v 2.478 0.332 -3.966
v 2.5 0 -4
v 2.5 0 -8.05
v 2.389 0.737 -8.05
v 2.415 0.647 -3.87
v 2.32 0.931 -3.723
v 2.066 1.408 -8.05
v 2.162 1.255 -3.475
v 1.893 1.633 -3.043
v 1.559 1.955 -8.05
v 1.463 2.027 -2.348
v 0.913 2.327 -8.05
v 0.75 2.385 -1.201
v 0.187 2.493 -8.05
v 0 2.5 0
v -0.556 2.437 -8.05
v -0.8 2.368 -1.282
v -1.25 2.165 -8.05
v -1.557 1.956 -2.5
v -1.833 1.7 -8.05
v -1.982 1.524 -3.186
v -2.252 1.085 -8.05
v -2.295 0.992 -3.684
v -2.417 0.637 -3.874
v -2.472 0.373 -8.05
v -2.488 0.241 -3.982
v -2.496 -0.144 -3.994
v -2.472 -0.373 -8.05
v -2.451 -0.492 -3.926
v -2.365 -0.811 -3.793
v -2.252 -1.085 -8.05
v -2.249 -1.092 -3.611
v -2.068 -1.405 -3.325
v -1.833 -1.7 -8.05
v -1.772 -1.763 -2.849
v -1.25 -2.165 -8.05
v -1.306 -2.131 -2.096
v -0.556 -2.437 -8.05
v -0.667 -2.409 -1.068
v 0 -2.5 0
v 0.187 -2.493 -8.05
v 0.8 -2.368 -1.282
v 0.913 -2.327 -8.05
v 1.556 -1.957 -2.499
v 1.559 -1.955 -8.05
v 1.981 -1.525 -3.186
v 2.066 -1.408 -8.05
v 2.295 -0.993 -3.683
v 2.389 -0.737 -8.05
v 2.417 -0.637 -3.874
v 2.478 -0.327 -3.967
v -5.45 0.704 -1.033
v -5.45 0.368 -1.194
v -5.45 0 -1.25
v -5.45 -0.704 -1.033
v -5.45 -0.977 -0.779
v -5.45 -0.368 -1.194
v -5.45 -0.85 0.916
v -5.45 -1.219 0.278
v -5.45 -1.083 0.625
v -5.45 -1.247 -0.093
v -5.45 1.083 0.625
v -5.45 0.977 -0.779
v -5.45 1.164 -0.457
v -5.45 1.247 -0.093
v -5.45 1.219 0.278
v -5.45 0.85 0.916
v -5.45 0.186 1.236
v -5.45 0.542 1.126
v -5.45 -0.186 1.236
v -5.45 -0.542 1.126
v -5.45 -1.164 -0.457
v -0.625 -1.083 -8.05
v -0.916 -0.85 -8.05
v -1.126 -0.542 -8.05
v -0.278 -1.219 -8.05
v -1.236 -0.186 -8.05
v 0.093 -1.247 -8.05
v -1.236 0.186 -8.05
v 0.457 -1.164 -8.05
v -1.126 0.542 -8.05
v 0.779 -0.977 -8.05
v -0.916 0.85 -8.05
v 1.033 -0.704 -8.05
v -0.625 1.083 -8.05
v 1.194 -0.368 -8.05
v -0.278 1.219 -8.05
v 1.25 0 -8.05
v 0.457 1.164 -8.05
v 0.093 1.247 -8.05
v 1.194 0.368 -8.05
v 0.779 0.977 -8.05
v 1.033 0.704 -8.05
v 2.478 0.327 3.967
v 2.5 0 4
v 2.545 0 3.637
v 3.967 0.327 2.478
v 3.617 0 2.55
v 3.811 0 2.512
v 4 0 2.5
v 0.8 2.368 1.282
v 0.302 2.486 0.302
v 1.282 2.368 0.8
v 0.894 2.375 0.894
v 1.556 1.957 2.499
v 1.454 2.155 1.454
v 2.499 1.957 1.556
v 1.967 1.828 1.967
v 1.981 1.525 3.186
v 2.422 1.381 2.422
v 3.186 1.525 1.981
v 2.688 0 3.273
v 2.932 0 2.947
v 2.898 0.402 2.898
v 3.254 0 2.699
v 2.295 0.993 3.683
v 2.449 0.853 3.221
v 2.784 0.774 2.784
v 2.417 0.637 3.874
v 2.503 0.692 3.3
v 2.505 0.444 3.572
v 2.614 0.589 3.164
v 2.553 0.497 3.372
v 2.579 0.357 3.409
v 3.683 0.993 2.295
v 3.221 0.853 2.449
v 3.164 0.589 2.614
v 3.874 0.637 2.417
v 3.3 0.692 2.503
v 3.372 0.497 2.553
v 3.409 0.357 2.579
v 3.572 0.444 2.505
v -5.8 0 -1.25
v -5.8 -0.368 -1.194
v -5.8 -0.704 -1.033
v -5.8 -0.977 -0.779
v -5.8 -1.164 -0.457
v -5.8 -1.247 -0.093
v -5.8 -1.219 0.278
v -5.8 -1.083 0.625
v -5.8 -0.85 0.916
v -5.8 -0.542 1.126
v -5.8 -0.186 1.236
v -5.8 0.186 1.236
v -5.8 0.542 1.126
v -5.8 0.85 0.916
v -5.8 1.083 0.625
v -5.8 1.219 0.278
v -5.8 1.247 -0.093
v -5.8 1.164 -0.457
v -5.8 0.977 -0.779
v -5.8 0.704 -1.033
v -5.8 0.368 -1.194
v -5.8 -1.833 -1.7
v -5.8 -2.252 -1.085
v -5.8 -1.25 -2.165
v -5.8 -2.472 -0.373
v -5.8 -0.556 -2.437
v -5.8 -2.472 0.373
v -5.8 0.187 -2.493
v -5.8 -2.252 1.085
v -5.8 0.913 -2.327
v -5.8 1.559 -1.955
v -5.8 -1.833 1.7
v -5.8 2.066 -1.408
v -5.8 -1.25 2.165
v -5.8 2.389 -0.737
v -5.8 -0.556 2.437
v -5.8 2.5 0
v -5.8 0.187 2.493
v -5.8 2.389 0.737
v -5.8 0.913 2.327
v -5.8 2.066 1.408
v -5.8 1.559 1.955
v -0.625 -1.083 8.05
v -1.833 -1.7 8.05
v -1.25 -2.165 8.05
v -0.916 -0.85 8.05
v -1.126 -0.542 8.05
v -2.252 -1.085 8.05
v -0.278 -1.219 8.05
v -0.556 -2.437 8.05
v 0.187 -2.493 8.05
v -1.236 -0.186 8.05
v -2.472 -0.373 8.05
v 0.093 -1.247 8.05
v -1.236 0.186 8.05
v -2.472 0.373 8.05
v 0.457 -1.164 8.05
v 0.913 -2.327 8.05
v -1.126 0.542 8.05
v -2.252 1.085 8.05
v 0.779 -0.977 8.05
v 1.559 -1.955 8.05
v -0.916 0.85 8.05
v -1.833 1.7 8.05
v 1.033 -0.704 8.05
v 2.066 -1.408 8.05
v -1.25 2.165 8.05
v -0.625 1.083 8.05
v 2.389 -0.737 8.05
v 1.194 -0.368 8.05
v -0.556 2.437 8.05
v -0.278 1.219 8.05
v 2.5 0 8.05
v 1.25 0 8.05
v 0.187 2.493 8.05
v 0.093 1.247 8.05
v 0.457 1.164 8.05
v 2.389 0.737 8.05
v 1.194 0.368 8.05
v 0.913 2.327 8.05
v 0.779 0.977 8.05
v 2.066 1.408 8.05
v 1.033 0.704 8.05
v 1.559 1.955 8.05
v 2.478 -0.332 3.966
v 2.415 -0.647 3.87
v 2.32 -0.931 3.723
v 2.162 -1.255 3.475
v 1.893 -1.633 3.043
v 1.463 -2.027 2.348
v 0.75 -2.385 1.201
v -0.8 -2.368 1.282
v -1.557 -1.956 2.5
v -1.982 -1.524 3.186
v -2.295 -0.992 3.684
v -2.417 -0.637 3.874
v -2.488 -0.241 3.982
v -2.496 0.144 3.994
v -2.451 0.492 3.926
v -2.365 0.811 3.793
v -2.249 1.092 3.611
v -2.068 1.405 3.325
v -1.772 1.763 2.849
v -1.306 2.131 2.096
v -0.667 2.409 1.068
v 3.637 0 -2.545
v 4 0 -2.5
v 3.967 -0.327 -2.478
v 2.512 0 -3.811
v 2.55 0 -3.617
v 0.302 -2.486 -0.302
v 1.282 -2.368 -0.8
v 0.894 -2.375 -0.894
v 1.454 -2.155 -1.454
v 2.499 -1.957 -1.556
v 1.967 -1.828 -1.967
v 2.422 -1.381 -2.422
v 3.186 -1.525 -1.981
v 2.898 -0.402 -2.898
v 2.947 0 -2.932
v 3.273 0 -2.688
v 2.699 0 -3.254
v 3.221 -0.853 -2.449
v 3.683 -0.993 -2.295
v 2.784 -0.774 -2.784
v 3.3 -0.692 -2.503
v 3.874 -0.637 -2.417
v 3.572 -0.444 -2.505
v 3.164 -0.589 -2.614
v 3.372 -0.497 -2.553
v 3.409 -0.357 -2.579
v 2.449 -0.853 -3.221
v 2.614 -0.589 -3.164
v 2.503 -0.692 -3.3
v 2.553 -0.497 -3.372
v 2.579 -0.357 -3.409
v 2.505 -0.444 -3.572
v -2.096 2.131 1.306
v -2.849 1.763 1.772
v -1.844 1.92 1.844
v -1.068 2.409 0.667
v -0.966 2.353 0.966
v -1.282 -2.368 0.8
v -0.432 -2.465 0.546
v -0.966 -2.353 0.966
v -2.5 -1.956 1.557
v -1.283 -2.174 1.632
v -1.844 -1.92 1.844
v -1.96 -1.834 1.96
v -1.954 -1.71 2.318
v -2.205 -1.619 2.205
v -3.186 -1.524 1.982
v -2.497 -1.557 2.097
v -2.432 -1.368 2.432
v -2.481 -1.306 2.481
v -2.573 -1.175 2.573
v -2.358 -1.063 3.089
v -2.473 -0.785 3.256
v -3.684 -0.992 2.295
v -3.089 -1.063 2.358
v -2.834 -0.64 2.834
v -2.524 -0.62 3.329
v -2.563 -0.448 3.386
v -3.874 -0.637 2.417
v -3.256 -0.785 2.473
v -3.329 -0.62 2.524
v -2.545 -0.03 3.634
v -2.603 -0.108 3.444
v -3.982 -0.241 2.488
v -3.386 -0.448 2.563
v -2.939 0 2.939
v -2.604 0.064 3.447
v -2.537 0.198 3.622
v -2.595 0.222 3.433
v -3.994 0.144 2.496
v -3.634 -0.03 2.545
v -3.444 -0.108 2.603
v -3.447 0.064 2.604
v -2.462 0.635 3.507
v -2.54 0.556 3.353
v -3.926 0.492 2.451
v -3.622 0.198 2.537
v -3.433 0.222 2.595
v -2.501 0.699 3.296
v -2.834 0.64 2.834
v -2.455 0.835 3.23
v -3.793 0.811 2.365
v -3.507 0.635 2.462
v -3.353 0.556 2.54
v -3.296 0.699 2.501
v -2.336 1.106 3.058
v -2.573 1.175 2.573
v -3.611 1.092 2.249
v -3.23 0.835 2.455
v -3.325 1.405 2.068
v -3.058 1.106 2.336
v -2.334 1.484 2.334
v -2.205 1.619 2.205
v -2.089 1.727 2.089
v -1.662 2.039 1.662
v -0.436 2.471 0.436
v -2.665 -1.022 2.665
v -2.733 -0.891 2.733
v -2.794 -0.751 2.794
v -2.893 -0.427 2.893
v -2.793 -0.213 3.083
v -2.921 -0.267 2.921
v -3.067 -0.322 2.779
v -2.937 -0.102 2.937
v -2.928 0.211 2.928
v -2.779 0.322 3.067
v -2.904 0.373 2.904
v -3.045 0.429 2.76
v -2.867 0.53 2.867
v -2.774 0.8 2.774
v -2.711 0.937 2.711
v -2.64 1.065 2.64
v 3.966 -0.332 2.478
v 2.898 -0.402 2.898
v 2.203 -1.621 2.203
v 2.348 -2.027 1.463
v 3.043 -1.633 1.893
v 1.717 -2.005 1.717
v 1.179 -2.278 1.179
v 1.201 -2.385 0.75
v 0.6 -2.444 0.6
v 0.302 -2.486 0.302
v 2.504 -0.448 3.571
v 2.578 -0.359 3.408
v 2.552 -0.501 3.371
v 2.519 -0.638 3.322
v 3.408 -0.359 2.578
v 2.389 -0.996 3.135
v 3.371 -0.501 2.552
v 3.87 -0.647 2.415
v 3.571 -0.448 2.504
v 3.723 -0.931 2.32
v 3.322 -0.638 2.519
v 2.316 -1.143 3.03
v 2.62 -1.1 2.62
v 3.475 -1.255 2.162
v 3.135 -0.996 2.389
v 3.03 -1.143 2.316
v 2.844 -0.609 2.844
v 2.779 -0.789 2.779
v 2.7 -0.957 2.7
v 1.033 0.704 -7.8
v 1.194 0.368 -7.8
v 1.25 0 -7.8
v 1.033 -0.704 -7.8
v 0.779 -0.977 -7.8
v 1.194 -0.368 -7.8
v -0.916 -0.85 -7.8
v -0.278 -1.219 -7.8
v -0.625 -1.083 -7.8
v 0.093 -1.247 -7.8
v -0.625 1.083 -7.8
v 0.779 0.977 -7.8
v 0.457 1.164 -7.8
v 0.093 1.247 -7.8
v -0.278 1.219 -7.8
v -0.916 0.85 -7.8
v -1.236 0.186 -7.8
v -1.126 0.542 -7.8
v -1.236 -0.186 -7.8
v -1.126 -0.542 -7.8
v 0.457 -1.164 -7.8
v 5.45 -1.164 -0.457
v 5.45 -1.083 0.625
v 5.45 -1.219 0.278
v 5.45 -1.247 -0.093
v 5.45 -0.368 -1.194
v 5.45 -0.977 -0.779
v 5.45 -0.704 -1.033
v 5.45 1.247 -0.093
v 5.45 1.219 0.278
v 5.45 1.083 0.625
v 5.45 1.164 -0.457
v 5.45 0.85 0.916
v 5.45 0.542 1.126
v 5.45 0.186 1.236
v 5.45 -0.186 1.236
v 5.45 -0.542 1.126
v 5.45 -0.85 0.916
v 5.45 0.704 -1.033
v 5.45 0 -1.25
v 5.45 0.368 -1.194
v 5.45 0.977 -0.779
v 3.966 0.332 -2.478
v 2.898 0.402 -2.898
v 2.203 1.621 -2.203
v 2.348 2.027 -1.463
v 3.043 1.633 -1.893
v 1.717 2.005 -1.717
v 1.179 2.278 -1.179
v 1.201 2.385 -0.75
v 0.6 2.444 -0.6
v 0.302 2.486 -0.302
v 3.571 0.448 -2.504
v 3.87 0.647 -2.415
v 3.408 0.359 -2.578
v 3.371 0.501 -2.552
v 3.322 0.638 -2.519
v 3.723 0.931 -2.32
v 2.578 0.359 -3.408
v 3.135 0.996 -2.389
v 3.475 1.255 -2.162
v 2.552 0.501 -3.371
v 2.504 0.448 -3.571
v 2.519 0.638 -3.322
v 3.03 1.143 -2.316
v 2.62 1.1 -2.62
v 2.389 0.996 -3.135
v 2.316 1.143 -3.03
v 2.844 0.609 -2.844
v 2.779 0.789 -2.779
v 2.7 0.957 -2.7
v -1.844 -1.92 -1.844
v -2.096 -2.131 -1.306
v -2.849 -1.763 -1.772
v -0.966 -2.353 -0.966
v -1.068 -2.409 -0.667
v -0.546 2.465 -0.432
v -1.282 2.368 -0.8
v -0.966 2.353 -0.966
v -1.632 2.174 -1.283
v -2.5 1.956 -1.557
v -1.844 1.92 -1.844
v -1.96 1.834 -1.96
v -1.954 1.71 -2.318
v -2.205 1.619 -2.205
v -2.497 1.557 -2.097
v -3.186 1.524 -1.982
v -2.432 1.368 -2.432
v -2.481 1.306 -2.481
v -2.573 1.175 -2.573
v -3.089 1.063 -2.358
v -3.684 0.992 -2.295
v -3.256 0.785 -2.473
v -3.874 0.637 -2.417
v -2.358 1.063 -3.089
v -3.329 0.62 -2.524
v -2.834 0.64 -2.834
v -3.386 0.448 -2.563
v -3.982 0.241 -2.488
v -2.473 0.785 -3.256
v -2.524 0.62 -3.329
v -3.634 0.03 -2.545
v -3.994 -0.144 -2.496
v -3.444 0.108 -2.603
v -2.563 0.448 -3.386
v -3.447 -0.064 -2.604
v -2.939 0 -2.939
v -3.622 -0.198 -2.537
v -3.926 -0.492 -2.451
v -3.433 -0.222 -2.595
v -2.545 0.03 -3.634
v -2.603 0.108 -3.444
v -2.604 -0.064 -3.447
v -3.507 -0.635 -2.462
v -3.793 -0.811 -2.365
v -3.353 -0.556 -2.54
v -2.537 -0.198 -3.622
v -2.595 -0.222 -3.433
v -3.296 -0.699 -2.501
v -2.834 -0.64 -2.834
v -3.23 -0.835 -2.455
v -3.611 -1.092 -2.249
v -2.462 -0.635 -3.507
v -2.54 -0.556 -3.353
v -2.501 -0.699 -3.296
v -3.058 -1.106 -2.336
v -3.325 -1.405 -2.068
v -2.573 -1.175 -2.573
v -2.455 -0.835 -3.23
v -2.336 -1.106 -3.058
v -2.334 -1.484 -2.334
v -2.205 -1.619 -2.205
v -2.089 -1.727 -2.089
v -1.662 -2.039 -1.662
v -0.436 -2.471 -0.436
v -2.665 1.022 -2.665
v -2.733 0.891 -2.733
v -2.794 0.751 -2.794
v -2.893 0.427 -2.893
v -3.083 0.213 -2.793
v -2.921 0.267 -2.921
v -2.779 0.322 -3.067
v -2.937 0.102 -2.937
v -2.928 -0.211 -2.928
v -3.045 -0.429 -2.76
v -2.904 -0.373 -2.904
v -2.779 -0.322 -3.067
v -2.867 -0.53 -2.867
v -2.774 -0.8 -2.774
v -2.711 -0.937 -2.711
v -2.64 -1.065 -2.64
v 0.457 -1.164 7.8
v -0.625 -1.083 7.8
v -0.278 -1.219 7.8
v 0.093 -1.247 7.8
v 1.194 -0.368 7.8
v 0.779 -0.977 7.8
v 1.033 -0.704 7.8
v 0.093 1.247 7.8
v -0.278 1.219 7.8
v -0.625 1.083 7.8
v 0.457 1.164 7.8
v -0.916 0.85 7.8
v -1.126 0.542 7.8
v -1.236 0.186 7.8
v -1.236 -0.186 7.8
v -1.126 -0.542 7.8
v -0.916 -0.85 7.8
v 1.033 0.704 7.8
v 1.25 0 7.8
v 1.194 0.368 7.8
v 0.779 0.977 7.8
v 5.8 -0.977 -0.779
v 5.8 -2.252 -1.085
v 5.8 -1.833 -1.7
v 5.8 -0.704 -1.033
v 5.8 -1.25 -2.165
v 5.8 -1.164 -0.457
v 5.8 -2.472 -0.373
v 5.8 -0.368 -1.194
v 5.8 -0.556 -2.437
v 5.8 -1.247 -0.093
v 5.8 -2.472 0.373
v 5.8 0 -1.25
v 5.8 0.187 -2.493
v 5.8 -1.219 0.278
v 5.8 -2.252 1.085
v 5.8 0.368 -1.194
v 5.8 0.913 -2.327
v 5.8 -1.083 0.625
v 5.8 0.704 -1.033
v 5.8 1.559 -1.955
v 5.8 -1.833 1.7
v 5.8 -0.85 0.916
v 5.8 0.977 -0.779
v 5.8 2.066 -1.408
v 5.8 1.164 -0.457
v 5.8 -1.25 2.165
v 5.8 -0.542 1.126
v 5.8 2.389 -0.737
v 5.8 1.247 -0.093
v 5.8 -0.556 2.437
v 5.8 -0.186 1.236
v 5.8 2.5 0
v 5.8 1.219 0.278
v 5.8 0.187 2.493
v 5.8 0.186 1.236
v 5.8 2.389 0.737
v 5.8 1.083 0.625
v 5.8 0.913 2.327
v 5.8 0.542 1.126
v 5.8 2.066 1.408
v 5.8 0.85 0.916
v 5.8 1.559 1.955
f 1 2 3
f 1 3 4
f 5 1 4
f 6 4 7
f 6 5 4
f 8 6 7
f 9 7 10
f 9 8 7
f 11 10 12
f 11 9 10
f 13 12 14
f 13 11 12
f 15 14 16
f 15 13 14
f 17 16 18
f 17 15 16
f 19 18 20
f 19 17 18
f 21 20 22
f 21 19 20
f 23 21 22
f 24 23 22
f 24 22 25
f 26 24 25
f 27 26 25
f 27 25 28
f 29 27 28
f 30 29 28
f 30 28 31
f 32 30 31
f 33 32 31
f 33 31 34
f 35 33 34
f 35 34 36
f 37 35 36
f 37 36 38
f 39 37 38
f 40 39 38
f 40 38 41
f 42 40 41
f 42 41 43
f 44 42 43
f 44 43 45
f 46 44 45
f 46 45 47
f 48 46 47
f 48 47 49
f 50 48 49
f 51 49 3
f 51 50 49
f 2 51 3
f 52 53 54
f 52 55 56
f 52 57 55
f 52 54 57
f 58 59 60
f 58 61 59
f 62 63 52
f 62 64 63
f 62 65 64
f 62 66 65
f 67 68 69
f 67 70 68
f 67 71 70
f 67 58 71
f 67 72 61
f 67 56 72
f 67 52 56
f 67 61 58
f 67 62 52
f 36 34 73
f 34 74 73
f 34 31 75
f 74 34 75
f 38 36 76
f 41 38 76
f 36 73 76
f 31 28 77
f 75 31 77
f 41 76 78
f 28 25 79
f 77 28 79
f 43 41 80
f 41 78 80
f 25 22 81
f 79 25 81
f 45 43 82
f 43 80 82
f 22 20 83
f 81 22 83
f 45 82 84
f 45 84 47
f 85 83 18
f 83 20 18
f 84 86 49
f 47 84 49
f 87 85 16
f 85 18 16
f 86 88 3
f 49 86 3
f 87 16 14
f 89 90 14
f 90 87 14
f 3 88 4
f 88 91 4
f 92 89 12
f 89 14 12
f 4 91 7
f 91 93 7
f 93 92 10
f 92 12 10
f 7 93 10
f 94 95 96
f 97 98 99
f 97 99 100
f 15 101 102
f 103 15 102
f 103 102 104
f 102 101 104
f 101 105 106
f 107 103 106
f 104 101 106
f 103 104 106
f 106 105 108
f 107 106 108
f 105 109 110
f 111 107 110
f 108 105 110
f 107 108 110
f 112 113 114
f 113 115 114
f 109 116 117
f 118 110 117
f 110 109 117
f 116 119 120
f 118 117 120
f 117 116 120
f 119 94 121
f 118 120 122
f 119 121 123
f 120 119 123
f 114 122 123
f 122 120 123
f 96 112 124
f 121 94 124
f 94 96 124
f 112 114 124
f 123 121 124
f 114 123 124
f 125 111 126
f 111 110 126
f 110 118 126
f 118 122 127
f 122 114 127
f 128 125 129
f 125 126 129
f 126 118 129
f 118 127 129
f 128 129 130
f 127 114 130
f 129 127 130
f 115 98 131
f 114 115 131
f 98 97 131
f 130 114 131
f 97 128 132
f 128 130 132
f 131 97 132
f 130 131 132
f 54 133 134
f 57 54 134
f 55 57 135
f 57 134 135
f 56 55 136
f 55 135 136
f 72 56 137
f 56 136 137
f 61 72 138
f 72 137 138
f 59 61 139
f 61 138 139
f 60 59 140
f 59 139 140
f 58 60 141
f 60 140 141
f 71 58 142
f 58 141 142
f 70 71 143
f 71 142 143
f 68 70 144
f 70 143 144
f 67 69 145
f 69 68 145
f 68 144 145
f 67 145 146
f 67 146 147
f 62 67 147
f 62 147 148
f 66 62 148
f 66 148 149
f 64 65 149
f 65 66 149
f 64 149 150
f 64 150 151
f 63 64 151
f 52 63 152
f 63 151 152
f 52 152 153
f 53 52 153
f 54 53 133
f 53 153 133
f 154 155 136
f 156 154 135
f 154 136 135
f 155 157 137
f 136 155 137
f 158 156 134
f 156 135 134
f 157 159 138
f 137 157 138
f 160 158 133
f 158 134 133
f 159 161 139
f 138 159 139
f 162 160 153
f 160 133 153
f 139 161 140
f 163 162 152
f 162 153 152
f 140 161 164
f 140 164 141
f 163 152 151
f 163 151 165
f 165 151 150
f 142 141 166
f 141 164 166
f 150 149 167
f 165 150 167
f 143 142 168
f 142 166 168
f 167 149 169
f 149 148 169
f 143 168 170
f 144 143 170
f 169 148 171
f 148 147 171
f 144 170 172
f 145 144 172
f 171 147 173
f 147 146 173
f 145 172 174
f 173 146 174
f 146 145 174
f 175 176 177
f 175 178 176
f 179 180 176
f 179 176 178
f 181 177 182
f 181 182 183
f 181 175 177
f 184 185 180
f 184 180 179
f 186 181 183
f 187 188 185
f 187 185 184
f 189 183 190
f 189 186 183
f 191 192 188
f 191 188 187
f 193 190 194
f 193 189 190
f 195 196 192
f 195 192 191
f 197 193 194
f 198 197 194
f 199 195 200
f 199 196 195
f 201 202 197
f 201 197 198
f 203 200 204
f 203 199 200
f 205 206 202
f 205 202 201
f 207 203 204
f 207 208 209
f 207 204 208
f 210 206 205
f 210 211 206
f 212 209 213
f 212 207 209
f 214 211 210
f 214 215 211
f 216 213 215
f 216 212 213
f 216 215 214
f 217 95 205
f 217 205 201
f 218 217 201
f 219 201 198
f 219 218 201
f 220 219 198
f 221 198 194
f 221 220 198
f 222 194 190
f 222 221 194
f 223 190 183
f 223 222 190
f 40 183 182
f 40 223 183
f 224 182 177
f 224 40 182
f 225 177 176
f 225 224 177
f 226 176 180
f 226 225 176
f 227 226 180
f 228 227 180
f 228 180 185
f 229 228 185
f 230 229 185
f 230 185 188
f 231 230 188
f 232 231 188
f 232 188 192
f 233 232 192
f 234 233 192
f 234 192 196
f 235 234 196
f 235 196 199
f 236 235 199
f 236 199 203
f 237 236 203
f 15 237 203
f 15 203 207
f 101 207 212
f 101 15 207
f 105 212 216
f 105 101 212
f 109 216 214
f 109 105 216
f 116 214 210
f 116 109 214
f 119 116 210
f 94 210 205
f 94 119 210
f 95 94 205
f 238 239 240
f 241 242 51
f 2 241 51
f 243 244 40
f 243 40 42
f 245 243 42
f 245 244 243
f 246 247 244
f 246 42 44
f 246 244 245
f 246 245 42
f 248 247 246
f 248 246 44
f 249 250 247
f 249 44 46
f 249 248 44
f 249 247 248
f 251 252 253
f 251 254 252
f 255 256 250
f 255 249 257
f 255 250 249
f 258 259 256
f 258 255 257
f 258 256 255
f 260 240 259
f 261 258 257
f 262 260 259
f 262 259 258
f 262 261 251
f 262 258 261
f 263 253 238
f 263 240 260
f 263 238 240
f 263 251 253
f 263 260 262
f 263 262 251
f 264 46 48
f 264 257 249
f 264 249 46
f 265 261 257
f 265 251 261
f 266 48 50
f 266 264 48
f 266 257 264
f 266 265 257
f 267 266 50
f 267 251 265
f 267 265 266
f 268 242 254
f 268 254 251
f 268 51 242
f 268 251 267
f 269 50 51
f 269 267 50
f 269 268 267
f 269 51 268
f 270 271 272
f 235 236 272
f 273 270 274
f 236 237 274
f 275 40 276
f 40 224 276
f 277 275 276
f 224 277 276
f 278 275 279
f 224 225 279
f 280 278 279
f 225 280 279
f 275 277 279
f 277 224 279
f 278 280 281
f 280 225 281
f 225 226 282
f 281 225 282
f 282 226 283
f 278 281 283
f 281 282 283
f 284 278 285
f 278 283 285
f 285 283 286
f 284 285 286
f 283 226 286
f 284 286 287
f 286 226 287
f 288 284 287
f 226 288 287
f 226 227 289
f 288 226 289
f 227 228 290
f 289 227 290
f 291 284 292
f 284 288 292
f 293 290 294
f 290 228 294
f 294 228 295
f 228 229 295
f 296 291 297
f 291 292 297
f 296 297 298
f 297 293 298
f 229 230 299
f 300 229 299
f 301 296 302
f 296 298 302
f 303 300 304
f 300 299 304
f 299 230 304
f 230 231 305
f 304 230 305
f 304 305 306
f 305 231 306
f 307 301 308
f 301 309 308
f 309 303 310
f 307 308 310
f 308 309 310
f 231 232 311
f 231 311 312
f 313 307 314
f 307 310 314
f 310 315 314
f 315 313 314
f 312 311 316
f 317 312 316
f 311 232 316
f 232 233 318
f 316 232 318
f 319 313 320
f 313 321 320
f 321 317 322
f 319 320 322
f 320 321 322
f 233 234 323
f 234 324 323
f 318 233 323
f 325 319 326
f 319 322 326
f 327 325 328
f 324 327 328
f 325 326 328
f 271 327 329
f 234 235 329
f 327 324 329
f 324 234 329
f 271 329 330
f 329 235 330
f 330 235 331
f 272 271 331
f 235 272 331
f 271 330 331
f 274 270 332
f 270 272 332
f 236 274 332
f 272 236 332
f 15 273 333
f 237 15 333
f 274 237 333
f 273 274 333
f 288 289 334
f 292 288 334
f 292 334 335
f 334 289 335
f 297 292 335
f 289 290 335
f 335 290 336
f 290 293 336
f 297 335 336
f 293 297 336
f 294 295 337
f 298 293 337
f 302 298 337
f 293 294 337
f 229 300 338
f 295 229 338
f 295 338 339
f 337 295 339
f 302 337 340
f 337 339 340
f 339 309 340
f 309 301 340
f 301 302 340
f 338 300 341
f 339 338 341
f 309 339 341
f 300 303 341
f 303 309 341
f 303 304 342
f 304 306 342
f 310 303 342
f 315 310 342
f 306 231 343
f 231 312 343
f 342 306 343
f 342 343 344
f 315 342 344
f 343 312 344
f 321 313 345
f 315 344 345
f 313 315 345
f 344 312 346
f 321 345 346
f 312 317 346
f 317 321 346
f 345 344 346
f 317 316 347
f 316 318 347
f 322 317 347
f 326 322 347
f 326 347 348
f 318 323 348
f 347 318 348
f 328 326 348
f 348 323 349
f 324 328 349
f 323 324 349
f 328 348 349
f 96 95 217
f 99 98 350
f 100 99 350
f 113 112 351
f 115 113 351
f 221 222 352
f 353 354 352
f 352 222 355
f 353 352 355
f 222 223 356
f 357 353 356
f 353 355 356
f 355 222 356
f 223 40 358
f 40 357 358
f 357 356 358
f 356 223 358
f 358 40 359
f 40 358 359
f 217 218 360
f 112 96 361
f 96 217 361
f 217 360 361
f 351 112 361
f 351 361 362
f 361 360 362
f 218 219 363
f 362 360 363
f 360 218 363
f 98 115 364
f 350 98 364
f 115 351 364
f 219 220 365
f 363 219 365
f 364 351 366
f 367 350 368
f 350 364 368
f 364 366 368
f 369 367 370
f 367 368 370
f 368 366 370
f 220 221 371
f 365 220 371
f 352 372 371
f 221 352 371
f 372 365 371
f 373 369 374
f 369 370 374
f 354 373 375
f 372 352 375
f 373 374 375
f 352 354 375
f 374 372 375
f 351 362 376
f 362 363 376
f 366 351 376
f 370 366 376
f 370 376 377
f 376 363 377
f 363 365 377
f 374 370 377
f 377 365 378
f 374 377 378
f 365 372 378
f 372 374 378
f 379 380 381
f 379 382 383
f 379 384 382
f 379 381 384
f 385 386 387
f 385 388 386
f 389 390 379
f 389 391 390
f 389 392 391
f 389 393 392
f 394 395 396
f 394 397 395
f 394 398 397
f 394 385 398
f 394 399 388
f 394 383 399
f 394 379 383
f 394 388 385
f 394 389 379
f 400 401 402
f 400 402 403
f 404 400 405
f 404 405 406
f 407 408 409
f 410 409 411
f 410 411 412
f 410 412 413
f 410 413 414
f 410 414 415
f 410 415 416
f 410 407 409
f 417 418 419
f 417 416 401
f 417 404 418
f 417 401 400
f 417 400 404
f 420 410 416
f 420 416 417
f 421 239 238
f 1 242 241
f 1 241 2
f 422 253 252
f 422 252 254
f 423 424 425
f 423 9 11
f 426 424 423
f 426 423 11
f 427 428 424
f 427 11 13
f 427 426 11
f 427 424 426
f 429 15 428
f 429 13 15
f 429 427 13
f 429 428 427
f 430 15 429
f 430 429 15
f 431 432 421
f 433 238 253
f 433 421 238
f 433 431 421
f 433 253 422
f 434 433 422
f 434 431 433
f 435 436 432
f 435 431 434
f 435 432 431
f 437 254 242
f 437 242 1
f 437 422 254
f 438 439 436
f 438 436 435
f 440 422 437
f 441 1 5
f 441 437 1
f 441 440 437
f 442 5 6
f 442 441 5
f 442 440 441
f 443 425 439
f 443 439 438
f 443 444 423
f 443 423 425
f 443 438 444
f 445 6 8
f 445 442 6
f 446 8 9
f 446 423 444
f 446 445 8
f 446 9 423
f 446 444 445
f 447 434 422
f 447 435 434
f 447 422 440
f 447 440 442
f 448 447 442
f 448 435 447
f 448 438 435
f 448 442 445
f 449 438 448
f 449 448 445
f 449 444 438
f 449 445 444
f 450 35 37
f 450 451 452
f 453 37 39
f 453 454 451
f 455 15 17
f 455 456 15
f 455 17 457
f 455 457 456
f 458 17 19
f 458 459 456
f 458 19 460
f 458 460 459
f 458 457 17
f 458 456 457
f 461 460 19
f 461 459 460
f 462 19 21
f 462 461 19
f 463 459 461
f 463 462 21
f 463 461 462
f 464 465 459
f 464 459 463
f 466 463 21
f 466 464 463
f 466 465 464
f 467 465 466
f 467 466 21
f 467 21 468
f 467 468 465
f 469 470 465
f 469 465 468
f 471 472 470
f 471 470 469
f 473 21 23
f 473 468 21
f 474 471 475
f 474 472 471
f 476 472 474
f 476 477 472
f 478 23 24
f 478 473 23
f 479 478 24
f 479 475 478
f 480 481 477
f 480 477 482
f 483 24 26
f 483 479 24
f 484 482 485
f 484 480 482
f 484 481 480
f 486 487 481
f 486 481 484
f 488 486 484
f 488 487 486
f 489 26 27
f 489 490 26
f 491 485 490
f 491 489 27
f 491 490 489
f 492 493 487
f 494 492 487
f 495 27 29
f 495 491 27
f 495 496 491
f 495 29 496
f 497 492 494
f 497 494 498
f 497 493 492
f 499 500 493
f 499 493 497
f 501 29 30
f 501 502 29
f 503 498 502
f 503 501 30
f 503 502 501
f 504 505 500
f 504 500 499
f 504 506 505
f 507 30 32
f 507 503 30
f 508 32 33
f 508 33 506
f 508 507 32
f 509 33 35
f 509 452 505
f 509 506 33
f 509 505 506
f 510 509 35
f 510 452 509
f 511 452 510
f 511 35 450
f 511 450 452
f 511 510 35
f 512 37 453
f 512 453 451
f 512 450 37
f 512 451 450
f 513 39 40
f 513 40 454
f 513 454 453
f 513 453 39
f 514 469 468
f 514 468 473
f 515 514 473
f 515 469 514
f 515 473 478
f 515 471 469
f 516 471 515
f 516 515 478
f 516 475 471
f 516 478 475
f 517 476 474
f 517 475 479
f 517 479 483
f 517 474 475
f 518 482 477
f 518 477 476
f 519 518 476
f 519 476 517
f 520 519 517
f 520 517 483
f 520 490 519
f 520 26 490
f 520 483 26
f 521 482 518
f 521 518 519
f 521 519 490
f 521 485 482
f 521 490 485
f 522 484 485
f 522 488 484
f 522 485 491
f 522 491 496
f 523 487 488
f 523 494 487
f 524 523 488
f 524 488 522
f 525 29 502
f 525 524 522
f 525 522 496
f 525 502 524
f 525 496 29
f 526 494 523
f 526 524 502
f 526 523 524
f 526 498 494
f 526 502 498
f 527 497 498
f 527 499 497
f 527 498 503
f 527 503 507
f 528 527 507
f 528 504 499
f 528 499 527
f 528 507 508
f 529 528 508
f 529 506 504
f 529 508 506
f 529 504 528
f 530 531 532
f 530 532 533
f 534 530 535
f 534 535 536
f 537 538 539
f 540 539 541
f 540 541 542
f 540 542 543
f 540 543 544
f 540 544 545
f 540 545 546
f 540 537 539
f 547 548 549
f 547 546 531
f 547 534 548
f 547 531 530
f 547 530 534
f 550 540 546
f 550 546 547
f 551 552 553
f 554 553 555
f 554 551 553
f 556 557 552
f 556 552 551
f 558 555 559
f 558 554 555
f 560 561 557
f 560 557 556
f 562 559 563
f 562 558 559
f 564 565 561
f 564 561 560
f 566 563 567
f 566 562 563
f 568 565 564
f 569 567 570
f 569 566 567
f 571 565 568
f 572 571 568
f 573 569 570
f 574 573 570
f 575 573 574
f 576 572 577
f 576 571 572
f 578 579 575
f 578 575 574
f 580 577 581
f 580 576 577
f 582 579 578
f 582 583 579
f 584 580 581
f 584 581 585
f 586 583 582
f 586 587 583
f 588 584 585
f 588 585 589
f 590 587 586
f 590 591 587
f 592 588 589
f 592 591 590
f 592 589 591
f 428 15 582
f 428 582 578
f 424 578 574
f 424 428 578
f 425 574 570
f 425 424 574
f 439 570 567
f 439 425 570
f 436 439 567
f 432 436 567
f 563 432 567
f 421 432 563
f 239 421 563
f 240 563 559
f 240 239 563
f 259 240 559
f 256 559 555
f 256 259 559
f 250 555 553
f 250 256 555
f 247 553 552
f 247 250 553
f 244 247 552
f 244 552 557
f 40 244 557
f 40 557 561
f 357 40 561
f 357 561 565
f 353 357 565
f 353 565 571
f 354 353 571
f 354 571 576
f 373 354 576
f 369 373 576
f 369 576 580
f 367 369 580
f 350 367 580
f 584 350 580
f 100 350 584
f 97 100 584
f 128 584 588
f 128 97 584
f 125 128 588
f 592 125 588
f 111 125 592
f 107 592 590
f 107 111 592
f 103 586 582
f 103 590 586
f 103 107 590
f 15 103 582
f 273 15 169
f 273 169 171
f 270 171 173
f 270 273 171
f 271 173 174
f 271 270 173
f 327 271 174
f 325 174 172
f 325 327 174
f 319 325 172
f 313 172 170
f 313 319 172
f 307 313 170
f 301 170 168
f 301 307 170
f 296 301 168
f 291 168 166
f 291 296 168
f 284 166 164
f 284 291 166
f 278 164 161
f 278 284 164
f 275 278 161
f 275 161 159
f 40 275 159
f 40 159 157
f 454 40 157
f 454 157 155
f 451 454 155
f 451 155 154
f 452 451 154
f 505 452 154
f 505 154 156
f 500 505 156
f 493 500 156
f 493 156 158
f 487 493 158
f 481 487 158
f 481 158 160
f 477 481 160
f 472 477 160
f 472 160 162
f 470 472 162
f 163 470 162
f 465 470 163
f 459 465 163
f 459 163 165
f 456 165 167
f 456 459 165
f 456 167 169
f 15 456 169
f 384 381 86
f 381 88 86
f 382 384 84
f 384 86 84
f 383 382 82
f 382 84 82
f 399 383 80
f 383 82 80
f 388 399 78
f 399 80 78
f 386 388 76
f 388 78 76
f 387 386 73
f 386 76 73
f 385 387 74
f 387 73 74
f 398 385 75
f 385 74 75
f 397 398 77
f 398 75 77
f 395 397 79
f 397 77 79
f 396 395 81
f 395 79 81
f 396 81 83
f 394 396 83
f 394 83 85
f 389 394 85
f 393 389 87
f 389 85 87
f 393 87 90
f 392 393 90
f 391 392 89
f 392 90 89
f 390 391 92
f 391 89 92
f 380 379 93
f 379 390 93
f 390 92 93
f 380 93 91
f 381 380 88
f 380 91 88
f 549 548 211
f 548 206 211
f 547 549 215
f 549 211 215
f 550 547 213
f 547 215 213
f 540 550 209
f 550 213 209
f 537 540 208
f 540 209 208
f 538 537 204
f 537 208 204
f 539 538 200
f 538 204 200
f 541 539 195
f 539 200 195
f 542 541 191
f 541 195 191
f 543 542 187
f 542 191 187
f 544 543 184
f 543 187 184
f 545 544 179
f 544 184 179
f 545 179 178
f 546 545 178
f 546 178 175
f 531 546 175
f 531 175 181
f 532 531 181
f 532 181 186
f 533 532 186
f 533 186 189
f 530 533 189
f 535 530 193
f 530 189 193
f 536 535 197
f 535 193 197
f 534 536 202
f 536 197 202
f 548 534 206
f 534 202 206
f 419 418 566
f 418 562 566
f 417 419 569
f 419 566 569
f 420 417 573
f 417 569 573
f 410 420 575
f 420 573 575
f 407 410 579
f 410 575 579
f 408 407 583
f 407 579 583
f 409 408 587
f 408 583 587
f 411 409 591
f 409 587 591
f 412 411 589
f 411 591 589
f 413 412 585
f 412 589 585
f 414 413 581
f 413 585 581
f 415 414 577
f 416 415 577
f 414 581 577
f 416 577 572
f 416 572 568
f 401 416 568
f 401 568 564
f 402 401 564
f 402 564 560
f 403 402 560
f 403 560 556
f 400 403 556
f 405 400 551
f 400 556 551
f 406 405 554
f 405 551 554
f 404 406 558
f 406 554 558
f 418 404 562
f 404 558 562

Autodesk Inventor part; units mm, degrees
ref_plane "YZ Plane" through (0, 0, 0) normal (1, 0, 0) x (0, 1, 0)
ref_plane "XZ Plane" through (0, 0, 0) normal (0, 1, 0) x (-1, 0, 0)
ref_plane "XY Plane" through (0, 0, 0) normal (0, 0, 1) x (1, 0, 0)
sketch "Sketch1" plane through (0, 0, 0) normal (0, 0, 1) x (1, 0, 0)
  circle A0 centre (0, 0) radius 2.5
  dimension "d0" = 5
extrude "Extrusion1" add sketch "Sketch1" along normal mid plane 16.1
sketch "Sketch2" plane through (0, 0, 8.05) normal (0, 0, 1) x (1, 0, 0)
  circle A0 centre (0, 0) radius 1.25
  dimension "d3" = 2.5
extrude "Extrusion2" cut sketch "Sketch2" against normal blind 0.25
mirror "Mirror1" about plane through (0, 0, 0) normal (0, 0, 1) of "Extrusion2"
sketch "Sketch3" plane through (0, 0, 0) normal (1, 0, 0) x (0, 1, 0)
  circle A0 centre (0, 0) radius 2.5
  dimension "d6" = 5
extrude "Extrusion3" add sketch "Sketch3" along normal mid plane 11.6
sketch "Sketch4" plane through (5.8, 0, 0) normal (1, 0, 0) x (0, 0, -1)
  circle A0 centre (0, 0) radius 1.25
  dimension "d9" = 2.5
extrude "Extrusion4" cut sketch "Sketch4" against normal blind 0.35
mirror "Mirror2" about plane through (0, 0, 0) normal (1, 0, 0) of "Extrusion4"
fillet "Fillet1" radius 1.5 6 edges at (1.7678, 1.7678, 1.7678) (-2.5, 0, 2.5) (1.7678, -1.7678, 1.7678) (1.7678, -1.7678, -1.7678) (1.7678, 1.7678, -1.7678) (-2.5, 0, -2.5)
ref_plane "Work Plane1" through (0, 0, 0) normal (1, 0, 0) x (0, 1, 0)
properties part number "Cross_Normal"
